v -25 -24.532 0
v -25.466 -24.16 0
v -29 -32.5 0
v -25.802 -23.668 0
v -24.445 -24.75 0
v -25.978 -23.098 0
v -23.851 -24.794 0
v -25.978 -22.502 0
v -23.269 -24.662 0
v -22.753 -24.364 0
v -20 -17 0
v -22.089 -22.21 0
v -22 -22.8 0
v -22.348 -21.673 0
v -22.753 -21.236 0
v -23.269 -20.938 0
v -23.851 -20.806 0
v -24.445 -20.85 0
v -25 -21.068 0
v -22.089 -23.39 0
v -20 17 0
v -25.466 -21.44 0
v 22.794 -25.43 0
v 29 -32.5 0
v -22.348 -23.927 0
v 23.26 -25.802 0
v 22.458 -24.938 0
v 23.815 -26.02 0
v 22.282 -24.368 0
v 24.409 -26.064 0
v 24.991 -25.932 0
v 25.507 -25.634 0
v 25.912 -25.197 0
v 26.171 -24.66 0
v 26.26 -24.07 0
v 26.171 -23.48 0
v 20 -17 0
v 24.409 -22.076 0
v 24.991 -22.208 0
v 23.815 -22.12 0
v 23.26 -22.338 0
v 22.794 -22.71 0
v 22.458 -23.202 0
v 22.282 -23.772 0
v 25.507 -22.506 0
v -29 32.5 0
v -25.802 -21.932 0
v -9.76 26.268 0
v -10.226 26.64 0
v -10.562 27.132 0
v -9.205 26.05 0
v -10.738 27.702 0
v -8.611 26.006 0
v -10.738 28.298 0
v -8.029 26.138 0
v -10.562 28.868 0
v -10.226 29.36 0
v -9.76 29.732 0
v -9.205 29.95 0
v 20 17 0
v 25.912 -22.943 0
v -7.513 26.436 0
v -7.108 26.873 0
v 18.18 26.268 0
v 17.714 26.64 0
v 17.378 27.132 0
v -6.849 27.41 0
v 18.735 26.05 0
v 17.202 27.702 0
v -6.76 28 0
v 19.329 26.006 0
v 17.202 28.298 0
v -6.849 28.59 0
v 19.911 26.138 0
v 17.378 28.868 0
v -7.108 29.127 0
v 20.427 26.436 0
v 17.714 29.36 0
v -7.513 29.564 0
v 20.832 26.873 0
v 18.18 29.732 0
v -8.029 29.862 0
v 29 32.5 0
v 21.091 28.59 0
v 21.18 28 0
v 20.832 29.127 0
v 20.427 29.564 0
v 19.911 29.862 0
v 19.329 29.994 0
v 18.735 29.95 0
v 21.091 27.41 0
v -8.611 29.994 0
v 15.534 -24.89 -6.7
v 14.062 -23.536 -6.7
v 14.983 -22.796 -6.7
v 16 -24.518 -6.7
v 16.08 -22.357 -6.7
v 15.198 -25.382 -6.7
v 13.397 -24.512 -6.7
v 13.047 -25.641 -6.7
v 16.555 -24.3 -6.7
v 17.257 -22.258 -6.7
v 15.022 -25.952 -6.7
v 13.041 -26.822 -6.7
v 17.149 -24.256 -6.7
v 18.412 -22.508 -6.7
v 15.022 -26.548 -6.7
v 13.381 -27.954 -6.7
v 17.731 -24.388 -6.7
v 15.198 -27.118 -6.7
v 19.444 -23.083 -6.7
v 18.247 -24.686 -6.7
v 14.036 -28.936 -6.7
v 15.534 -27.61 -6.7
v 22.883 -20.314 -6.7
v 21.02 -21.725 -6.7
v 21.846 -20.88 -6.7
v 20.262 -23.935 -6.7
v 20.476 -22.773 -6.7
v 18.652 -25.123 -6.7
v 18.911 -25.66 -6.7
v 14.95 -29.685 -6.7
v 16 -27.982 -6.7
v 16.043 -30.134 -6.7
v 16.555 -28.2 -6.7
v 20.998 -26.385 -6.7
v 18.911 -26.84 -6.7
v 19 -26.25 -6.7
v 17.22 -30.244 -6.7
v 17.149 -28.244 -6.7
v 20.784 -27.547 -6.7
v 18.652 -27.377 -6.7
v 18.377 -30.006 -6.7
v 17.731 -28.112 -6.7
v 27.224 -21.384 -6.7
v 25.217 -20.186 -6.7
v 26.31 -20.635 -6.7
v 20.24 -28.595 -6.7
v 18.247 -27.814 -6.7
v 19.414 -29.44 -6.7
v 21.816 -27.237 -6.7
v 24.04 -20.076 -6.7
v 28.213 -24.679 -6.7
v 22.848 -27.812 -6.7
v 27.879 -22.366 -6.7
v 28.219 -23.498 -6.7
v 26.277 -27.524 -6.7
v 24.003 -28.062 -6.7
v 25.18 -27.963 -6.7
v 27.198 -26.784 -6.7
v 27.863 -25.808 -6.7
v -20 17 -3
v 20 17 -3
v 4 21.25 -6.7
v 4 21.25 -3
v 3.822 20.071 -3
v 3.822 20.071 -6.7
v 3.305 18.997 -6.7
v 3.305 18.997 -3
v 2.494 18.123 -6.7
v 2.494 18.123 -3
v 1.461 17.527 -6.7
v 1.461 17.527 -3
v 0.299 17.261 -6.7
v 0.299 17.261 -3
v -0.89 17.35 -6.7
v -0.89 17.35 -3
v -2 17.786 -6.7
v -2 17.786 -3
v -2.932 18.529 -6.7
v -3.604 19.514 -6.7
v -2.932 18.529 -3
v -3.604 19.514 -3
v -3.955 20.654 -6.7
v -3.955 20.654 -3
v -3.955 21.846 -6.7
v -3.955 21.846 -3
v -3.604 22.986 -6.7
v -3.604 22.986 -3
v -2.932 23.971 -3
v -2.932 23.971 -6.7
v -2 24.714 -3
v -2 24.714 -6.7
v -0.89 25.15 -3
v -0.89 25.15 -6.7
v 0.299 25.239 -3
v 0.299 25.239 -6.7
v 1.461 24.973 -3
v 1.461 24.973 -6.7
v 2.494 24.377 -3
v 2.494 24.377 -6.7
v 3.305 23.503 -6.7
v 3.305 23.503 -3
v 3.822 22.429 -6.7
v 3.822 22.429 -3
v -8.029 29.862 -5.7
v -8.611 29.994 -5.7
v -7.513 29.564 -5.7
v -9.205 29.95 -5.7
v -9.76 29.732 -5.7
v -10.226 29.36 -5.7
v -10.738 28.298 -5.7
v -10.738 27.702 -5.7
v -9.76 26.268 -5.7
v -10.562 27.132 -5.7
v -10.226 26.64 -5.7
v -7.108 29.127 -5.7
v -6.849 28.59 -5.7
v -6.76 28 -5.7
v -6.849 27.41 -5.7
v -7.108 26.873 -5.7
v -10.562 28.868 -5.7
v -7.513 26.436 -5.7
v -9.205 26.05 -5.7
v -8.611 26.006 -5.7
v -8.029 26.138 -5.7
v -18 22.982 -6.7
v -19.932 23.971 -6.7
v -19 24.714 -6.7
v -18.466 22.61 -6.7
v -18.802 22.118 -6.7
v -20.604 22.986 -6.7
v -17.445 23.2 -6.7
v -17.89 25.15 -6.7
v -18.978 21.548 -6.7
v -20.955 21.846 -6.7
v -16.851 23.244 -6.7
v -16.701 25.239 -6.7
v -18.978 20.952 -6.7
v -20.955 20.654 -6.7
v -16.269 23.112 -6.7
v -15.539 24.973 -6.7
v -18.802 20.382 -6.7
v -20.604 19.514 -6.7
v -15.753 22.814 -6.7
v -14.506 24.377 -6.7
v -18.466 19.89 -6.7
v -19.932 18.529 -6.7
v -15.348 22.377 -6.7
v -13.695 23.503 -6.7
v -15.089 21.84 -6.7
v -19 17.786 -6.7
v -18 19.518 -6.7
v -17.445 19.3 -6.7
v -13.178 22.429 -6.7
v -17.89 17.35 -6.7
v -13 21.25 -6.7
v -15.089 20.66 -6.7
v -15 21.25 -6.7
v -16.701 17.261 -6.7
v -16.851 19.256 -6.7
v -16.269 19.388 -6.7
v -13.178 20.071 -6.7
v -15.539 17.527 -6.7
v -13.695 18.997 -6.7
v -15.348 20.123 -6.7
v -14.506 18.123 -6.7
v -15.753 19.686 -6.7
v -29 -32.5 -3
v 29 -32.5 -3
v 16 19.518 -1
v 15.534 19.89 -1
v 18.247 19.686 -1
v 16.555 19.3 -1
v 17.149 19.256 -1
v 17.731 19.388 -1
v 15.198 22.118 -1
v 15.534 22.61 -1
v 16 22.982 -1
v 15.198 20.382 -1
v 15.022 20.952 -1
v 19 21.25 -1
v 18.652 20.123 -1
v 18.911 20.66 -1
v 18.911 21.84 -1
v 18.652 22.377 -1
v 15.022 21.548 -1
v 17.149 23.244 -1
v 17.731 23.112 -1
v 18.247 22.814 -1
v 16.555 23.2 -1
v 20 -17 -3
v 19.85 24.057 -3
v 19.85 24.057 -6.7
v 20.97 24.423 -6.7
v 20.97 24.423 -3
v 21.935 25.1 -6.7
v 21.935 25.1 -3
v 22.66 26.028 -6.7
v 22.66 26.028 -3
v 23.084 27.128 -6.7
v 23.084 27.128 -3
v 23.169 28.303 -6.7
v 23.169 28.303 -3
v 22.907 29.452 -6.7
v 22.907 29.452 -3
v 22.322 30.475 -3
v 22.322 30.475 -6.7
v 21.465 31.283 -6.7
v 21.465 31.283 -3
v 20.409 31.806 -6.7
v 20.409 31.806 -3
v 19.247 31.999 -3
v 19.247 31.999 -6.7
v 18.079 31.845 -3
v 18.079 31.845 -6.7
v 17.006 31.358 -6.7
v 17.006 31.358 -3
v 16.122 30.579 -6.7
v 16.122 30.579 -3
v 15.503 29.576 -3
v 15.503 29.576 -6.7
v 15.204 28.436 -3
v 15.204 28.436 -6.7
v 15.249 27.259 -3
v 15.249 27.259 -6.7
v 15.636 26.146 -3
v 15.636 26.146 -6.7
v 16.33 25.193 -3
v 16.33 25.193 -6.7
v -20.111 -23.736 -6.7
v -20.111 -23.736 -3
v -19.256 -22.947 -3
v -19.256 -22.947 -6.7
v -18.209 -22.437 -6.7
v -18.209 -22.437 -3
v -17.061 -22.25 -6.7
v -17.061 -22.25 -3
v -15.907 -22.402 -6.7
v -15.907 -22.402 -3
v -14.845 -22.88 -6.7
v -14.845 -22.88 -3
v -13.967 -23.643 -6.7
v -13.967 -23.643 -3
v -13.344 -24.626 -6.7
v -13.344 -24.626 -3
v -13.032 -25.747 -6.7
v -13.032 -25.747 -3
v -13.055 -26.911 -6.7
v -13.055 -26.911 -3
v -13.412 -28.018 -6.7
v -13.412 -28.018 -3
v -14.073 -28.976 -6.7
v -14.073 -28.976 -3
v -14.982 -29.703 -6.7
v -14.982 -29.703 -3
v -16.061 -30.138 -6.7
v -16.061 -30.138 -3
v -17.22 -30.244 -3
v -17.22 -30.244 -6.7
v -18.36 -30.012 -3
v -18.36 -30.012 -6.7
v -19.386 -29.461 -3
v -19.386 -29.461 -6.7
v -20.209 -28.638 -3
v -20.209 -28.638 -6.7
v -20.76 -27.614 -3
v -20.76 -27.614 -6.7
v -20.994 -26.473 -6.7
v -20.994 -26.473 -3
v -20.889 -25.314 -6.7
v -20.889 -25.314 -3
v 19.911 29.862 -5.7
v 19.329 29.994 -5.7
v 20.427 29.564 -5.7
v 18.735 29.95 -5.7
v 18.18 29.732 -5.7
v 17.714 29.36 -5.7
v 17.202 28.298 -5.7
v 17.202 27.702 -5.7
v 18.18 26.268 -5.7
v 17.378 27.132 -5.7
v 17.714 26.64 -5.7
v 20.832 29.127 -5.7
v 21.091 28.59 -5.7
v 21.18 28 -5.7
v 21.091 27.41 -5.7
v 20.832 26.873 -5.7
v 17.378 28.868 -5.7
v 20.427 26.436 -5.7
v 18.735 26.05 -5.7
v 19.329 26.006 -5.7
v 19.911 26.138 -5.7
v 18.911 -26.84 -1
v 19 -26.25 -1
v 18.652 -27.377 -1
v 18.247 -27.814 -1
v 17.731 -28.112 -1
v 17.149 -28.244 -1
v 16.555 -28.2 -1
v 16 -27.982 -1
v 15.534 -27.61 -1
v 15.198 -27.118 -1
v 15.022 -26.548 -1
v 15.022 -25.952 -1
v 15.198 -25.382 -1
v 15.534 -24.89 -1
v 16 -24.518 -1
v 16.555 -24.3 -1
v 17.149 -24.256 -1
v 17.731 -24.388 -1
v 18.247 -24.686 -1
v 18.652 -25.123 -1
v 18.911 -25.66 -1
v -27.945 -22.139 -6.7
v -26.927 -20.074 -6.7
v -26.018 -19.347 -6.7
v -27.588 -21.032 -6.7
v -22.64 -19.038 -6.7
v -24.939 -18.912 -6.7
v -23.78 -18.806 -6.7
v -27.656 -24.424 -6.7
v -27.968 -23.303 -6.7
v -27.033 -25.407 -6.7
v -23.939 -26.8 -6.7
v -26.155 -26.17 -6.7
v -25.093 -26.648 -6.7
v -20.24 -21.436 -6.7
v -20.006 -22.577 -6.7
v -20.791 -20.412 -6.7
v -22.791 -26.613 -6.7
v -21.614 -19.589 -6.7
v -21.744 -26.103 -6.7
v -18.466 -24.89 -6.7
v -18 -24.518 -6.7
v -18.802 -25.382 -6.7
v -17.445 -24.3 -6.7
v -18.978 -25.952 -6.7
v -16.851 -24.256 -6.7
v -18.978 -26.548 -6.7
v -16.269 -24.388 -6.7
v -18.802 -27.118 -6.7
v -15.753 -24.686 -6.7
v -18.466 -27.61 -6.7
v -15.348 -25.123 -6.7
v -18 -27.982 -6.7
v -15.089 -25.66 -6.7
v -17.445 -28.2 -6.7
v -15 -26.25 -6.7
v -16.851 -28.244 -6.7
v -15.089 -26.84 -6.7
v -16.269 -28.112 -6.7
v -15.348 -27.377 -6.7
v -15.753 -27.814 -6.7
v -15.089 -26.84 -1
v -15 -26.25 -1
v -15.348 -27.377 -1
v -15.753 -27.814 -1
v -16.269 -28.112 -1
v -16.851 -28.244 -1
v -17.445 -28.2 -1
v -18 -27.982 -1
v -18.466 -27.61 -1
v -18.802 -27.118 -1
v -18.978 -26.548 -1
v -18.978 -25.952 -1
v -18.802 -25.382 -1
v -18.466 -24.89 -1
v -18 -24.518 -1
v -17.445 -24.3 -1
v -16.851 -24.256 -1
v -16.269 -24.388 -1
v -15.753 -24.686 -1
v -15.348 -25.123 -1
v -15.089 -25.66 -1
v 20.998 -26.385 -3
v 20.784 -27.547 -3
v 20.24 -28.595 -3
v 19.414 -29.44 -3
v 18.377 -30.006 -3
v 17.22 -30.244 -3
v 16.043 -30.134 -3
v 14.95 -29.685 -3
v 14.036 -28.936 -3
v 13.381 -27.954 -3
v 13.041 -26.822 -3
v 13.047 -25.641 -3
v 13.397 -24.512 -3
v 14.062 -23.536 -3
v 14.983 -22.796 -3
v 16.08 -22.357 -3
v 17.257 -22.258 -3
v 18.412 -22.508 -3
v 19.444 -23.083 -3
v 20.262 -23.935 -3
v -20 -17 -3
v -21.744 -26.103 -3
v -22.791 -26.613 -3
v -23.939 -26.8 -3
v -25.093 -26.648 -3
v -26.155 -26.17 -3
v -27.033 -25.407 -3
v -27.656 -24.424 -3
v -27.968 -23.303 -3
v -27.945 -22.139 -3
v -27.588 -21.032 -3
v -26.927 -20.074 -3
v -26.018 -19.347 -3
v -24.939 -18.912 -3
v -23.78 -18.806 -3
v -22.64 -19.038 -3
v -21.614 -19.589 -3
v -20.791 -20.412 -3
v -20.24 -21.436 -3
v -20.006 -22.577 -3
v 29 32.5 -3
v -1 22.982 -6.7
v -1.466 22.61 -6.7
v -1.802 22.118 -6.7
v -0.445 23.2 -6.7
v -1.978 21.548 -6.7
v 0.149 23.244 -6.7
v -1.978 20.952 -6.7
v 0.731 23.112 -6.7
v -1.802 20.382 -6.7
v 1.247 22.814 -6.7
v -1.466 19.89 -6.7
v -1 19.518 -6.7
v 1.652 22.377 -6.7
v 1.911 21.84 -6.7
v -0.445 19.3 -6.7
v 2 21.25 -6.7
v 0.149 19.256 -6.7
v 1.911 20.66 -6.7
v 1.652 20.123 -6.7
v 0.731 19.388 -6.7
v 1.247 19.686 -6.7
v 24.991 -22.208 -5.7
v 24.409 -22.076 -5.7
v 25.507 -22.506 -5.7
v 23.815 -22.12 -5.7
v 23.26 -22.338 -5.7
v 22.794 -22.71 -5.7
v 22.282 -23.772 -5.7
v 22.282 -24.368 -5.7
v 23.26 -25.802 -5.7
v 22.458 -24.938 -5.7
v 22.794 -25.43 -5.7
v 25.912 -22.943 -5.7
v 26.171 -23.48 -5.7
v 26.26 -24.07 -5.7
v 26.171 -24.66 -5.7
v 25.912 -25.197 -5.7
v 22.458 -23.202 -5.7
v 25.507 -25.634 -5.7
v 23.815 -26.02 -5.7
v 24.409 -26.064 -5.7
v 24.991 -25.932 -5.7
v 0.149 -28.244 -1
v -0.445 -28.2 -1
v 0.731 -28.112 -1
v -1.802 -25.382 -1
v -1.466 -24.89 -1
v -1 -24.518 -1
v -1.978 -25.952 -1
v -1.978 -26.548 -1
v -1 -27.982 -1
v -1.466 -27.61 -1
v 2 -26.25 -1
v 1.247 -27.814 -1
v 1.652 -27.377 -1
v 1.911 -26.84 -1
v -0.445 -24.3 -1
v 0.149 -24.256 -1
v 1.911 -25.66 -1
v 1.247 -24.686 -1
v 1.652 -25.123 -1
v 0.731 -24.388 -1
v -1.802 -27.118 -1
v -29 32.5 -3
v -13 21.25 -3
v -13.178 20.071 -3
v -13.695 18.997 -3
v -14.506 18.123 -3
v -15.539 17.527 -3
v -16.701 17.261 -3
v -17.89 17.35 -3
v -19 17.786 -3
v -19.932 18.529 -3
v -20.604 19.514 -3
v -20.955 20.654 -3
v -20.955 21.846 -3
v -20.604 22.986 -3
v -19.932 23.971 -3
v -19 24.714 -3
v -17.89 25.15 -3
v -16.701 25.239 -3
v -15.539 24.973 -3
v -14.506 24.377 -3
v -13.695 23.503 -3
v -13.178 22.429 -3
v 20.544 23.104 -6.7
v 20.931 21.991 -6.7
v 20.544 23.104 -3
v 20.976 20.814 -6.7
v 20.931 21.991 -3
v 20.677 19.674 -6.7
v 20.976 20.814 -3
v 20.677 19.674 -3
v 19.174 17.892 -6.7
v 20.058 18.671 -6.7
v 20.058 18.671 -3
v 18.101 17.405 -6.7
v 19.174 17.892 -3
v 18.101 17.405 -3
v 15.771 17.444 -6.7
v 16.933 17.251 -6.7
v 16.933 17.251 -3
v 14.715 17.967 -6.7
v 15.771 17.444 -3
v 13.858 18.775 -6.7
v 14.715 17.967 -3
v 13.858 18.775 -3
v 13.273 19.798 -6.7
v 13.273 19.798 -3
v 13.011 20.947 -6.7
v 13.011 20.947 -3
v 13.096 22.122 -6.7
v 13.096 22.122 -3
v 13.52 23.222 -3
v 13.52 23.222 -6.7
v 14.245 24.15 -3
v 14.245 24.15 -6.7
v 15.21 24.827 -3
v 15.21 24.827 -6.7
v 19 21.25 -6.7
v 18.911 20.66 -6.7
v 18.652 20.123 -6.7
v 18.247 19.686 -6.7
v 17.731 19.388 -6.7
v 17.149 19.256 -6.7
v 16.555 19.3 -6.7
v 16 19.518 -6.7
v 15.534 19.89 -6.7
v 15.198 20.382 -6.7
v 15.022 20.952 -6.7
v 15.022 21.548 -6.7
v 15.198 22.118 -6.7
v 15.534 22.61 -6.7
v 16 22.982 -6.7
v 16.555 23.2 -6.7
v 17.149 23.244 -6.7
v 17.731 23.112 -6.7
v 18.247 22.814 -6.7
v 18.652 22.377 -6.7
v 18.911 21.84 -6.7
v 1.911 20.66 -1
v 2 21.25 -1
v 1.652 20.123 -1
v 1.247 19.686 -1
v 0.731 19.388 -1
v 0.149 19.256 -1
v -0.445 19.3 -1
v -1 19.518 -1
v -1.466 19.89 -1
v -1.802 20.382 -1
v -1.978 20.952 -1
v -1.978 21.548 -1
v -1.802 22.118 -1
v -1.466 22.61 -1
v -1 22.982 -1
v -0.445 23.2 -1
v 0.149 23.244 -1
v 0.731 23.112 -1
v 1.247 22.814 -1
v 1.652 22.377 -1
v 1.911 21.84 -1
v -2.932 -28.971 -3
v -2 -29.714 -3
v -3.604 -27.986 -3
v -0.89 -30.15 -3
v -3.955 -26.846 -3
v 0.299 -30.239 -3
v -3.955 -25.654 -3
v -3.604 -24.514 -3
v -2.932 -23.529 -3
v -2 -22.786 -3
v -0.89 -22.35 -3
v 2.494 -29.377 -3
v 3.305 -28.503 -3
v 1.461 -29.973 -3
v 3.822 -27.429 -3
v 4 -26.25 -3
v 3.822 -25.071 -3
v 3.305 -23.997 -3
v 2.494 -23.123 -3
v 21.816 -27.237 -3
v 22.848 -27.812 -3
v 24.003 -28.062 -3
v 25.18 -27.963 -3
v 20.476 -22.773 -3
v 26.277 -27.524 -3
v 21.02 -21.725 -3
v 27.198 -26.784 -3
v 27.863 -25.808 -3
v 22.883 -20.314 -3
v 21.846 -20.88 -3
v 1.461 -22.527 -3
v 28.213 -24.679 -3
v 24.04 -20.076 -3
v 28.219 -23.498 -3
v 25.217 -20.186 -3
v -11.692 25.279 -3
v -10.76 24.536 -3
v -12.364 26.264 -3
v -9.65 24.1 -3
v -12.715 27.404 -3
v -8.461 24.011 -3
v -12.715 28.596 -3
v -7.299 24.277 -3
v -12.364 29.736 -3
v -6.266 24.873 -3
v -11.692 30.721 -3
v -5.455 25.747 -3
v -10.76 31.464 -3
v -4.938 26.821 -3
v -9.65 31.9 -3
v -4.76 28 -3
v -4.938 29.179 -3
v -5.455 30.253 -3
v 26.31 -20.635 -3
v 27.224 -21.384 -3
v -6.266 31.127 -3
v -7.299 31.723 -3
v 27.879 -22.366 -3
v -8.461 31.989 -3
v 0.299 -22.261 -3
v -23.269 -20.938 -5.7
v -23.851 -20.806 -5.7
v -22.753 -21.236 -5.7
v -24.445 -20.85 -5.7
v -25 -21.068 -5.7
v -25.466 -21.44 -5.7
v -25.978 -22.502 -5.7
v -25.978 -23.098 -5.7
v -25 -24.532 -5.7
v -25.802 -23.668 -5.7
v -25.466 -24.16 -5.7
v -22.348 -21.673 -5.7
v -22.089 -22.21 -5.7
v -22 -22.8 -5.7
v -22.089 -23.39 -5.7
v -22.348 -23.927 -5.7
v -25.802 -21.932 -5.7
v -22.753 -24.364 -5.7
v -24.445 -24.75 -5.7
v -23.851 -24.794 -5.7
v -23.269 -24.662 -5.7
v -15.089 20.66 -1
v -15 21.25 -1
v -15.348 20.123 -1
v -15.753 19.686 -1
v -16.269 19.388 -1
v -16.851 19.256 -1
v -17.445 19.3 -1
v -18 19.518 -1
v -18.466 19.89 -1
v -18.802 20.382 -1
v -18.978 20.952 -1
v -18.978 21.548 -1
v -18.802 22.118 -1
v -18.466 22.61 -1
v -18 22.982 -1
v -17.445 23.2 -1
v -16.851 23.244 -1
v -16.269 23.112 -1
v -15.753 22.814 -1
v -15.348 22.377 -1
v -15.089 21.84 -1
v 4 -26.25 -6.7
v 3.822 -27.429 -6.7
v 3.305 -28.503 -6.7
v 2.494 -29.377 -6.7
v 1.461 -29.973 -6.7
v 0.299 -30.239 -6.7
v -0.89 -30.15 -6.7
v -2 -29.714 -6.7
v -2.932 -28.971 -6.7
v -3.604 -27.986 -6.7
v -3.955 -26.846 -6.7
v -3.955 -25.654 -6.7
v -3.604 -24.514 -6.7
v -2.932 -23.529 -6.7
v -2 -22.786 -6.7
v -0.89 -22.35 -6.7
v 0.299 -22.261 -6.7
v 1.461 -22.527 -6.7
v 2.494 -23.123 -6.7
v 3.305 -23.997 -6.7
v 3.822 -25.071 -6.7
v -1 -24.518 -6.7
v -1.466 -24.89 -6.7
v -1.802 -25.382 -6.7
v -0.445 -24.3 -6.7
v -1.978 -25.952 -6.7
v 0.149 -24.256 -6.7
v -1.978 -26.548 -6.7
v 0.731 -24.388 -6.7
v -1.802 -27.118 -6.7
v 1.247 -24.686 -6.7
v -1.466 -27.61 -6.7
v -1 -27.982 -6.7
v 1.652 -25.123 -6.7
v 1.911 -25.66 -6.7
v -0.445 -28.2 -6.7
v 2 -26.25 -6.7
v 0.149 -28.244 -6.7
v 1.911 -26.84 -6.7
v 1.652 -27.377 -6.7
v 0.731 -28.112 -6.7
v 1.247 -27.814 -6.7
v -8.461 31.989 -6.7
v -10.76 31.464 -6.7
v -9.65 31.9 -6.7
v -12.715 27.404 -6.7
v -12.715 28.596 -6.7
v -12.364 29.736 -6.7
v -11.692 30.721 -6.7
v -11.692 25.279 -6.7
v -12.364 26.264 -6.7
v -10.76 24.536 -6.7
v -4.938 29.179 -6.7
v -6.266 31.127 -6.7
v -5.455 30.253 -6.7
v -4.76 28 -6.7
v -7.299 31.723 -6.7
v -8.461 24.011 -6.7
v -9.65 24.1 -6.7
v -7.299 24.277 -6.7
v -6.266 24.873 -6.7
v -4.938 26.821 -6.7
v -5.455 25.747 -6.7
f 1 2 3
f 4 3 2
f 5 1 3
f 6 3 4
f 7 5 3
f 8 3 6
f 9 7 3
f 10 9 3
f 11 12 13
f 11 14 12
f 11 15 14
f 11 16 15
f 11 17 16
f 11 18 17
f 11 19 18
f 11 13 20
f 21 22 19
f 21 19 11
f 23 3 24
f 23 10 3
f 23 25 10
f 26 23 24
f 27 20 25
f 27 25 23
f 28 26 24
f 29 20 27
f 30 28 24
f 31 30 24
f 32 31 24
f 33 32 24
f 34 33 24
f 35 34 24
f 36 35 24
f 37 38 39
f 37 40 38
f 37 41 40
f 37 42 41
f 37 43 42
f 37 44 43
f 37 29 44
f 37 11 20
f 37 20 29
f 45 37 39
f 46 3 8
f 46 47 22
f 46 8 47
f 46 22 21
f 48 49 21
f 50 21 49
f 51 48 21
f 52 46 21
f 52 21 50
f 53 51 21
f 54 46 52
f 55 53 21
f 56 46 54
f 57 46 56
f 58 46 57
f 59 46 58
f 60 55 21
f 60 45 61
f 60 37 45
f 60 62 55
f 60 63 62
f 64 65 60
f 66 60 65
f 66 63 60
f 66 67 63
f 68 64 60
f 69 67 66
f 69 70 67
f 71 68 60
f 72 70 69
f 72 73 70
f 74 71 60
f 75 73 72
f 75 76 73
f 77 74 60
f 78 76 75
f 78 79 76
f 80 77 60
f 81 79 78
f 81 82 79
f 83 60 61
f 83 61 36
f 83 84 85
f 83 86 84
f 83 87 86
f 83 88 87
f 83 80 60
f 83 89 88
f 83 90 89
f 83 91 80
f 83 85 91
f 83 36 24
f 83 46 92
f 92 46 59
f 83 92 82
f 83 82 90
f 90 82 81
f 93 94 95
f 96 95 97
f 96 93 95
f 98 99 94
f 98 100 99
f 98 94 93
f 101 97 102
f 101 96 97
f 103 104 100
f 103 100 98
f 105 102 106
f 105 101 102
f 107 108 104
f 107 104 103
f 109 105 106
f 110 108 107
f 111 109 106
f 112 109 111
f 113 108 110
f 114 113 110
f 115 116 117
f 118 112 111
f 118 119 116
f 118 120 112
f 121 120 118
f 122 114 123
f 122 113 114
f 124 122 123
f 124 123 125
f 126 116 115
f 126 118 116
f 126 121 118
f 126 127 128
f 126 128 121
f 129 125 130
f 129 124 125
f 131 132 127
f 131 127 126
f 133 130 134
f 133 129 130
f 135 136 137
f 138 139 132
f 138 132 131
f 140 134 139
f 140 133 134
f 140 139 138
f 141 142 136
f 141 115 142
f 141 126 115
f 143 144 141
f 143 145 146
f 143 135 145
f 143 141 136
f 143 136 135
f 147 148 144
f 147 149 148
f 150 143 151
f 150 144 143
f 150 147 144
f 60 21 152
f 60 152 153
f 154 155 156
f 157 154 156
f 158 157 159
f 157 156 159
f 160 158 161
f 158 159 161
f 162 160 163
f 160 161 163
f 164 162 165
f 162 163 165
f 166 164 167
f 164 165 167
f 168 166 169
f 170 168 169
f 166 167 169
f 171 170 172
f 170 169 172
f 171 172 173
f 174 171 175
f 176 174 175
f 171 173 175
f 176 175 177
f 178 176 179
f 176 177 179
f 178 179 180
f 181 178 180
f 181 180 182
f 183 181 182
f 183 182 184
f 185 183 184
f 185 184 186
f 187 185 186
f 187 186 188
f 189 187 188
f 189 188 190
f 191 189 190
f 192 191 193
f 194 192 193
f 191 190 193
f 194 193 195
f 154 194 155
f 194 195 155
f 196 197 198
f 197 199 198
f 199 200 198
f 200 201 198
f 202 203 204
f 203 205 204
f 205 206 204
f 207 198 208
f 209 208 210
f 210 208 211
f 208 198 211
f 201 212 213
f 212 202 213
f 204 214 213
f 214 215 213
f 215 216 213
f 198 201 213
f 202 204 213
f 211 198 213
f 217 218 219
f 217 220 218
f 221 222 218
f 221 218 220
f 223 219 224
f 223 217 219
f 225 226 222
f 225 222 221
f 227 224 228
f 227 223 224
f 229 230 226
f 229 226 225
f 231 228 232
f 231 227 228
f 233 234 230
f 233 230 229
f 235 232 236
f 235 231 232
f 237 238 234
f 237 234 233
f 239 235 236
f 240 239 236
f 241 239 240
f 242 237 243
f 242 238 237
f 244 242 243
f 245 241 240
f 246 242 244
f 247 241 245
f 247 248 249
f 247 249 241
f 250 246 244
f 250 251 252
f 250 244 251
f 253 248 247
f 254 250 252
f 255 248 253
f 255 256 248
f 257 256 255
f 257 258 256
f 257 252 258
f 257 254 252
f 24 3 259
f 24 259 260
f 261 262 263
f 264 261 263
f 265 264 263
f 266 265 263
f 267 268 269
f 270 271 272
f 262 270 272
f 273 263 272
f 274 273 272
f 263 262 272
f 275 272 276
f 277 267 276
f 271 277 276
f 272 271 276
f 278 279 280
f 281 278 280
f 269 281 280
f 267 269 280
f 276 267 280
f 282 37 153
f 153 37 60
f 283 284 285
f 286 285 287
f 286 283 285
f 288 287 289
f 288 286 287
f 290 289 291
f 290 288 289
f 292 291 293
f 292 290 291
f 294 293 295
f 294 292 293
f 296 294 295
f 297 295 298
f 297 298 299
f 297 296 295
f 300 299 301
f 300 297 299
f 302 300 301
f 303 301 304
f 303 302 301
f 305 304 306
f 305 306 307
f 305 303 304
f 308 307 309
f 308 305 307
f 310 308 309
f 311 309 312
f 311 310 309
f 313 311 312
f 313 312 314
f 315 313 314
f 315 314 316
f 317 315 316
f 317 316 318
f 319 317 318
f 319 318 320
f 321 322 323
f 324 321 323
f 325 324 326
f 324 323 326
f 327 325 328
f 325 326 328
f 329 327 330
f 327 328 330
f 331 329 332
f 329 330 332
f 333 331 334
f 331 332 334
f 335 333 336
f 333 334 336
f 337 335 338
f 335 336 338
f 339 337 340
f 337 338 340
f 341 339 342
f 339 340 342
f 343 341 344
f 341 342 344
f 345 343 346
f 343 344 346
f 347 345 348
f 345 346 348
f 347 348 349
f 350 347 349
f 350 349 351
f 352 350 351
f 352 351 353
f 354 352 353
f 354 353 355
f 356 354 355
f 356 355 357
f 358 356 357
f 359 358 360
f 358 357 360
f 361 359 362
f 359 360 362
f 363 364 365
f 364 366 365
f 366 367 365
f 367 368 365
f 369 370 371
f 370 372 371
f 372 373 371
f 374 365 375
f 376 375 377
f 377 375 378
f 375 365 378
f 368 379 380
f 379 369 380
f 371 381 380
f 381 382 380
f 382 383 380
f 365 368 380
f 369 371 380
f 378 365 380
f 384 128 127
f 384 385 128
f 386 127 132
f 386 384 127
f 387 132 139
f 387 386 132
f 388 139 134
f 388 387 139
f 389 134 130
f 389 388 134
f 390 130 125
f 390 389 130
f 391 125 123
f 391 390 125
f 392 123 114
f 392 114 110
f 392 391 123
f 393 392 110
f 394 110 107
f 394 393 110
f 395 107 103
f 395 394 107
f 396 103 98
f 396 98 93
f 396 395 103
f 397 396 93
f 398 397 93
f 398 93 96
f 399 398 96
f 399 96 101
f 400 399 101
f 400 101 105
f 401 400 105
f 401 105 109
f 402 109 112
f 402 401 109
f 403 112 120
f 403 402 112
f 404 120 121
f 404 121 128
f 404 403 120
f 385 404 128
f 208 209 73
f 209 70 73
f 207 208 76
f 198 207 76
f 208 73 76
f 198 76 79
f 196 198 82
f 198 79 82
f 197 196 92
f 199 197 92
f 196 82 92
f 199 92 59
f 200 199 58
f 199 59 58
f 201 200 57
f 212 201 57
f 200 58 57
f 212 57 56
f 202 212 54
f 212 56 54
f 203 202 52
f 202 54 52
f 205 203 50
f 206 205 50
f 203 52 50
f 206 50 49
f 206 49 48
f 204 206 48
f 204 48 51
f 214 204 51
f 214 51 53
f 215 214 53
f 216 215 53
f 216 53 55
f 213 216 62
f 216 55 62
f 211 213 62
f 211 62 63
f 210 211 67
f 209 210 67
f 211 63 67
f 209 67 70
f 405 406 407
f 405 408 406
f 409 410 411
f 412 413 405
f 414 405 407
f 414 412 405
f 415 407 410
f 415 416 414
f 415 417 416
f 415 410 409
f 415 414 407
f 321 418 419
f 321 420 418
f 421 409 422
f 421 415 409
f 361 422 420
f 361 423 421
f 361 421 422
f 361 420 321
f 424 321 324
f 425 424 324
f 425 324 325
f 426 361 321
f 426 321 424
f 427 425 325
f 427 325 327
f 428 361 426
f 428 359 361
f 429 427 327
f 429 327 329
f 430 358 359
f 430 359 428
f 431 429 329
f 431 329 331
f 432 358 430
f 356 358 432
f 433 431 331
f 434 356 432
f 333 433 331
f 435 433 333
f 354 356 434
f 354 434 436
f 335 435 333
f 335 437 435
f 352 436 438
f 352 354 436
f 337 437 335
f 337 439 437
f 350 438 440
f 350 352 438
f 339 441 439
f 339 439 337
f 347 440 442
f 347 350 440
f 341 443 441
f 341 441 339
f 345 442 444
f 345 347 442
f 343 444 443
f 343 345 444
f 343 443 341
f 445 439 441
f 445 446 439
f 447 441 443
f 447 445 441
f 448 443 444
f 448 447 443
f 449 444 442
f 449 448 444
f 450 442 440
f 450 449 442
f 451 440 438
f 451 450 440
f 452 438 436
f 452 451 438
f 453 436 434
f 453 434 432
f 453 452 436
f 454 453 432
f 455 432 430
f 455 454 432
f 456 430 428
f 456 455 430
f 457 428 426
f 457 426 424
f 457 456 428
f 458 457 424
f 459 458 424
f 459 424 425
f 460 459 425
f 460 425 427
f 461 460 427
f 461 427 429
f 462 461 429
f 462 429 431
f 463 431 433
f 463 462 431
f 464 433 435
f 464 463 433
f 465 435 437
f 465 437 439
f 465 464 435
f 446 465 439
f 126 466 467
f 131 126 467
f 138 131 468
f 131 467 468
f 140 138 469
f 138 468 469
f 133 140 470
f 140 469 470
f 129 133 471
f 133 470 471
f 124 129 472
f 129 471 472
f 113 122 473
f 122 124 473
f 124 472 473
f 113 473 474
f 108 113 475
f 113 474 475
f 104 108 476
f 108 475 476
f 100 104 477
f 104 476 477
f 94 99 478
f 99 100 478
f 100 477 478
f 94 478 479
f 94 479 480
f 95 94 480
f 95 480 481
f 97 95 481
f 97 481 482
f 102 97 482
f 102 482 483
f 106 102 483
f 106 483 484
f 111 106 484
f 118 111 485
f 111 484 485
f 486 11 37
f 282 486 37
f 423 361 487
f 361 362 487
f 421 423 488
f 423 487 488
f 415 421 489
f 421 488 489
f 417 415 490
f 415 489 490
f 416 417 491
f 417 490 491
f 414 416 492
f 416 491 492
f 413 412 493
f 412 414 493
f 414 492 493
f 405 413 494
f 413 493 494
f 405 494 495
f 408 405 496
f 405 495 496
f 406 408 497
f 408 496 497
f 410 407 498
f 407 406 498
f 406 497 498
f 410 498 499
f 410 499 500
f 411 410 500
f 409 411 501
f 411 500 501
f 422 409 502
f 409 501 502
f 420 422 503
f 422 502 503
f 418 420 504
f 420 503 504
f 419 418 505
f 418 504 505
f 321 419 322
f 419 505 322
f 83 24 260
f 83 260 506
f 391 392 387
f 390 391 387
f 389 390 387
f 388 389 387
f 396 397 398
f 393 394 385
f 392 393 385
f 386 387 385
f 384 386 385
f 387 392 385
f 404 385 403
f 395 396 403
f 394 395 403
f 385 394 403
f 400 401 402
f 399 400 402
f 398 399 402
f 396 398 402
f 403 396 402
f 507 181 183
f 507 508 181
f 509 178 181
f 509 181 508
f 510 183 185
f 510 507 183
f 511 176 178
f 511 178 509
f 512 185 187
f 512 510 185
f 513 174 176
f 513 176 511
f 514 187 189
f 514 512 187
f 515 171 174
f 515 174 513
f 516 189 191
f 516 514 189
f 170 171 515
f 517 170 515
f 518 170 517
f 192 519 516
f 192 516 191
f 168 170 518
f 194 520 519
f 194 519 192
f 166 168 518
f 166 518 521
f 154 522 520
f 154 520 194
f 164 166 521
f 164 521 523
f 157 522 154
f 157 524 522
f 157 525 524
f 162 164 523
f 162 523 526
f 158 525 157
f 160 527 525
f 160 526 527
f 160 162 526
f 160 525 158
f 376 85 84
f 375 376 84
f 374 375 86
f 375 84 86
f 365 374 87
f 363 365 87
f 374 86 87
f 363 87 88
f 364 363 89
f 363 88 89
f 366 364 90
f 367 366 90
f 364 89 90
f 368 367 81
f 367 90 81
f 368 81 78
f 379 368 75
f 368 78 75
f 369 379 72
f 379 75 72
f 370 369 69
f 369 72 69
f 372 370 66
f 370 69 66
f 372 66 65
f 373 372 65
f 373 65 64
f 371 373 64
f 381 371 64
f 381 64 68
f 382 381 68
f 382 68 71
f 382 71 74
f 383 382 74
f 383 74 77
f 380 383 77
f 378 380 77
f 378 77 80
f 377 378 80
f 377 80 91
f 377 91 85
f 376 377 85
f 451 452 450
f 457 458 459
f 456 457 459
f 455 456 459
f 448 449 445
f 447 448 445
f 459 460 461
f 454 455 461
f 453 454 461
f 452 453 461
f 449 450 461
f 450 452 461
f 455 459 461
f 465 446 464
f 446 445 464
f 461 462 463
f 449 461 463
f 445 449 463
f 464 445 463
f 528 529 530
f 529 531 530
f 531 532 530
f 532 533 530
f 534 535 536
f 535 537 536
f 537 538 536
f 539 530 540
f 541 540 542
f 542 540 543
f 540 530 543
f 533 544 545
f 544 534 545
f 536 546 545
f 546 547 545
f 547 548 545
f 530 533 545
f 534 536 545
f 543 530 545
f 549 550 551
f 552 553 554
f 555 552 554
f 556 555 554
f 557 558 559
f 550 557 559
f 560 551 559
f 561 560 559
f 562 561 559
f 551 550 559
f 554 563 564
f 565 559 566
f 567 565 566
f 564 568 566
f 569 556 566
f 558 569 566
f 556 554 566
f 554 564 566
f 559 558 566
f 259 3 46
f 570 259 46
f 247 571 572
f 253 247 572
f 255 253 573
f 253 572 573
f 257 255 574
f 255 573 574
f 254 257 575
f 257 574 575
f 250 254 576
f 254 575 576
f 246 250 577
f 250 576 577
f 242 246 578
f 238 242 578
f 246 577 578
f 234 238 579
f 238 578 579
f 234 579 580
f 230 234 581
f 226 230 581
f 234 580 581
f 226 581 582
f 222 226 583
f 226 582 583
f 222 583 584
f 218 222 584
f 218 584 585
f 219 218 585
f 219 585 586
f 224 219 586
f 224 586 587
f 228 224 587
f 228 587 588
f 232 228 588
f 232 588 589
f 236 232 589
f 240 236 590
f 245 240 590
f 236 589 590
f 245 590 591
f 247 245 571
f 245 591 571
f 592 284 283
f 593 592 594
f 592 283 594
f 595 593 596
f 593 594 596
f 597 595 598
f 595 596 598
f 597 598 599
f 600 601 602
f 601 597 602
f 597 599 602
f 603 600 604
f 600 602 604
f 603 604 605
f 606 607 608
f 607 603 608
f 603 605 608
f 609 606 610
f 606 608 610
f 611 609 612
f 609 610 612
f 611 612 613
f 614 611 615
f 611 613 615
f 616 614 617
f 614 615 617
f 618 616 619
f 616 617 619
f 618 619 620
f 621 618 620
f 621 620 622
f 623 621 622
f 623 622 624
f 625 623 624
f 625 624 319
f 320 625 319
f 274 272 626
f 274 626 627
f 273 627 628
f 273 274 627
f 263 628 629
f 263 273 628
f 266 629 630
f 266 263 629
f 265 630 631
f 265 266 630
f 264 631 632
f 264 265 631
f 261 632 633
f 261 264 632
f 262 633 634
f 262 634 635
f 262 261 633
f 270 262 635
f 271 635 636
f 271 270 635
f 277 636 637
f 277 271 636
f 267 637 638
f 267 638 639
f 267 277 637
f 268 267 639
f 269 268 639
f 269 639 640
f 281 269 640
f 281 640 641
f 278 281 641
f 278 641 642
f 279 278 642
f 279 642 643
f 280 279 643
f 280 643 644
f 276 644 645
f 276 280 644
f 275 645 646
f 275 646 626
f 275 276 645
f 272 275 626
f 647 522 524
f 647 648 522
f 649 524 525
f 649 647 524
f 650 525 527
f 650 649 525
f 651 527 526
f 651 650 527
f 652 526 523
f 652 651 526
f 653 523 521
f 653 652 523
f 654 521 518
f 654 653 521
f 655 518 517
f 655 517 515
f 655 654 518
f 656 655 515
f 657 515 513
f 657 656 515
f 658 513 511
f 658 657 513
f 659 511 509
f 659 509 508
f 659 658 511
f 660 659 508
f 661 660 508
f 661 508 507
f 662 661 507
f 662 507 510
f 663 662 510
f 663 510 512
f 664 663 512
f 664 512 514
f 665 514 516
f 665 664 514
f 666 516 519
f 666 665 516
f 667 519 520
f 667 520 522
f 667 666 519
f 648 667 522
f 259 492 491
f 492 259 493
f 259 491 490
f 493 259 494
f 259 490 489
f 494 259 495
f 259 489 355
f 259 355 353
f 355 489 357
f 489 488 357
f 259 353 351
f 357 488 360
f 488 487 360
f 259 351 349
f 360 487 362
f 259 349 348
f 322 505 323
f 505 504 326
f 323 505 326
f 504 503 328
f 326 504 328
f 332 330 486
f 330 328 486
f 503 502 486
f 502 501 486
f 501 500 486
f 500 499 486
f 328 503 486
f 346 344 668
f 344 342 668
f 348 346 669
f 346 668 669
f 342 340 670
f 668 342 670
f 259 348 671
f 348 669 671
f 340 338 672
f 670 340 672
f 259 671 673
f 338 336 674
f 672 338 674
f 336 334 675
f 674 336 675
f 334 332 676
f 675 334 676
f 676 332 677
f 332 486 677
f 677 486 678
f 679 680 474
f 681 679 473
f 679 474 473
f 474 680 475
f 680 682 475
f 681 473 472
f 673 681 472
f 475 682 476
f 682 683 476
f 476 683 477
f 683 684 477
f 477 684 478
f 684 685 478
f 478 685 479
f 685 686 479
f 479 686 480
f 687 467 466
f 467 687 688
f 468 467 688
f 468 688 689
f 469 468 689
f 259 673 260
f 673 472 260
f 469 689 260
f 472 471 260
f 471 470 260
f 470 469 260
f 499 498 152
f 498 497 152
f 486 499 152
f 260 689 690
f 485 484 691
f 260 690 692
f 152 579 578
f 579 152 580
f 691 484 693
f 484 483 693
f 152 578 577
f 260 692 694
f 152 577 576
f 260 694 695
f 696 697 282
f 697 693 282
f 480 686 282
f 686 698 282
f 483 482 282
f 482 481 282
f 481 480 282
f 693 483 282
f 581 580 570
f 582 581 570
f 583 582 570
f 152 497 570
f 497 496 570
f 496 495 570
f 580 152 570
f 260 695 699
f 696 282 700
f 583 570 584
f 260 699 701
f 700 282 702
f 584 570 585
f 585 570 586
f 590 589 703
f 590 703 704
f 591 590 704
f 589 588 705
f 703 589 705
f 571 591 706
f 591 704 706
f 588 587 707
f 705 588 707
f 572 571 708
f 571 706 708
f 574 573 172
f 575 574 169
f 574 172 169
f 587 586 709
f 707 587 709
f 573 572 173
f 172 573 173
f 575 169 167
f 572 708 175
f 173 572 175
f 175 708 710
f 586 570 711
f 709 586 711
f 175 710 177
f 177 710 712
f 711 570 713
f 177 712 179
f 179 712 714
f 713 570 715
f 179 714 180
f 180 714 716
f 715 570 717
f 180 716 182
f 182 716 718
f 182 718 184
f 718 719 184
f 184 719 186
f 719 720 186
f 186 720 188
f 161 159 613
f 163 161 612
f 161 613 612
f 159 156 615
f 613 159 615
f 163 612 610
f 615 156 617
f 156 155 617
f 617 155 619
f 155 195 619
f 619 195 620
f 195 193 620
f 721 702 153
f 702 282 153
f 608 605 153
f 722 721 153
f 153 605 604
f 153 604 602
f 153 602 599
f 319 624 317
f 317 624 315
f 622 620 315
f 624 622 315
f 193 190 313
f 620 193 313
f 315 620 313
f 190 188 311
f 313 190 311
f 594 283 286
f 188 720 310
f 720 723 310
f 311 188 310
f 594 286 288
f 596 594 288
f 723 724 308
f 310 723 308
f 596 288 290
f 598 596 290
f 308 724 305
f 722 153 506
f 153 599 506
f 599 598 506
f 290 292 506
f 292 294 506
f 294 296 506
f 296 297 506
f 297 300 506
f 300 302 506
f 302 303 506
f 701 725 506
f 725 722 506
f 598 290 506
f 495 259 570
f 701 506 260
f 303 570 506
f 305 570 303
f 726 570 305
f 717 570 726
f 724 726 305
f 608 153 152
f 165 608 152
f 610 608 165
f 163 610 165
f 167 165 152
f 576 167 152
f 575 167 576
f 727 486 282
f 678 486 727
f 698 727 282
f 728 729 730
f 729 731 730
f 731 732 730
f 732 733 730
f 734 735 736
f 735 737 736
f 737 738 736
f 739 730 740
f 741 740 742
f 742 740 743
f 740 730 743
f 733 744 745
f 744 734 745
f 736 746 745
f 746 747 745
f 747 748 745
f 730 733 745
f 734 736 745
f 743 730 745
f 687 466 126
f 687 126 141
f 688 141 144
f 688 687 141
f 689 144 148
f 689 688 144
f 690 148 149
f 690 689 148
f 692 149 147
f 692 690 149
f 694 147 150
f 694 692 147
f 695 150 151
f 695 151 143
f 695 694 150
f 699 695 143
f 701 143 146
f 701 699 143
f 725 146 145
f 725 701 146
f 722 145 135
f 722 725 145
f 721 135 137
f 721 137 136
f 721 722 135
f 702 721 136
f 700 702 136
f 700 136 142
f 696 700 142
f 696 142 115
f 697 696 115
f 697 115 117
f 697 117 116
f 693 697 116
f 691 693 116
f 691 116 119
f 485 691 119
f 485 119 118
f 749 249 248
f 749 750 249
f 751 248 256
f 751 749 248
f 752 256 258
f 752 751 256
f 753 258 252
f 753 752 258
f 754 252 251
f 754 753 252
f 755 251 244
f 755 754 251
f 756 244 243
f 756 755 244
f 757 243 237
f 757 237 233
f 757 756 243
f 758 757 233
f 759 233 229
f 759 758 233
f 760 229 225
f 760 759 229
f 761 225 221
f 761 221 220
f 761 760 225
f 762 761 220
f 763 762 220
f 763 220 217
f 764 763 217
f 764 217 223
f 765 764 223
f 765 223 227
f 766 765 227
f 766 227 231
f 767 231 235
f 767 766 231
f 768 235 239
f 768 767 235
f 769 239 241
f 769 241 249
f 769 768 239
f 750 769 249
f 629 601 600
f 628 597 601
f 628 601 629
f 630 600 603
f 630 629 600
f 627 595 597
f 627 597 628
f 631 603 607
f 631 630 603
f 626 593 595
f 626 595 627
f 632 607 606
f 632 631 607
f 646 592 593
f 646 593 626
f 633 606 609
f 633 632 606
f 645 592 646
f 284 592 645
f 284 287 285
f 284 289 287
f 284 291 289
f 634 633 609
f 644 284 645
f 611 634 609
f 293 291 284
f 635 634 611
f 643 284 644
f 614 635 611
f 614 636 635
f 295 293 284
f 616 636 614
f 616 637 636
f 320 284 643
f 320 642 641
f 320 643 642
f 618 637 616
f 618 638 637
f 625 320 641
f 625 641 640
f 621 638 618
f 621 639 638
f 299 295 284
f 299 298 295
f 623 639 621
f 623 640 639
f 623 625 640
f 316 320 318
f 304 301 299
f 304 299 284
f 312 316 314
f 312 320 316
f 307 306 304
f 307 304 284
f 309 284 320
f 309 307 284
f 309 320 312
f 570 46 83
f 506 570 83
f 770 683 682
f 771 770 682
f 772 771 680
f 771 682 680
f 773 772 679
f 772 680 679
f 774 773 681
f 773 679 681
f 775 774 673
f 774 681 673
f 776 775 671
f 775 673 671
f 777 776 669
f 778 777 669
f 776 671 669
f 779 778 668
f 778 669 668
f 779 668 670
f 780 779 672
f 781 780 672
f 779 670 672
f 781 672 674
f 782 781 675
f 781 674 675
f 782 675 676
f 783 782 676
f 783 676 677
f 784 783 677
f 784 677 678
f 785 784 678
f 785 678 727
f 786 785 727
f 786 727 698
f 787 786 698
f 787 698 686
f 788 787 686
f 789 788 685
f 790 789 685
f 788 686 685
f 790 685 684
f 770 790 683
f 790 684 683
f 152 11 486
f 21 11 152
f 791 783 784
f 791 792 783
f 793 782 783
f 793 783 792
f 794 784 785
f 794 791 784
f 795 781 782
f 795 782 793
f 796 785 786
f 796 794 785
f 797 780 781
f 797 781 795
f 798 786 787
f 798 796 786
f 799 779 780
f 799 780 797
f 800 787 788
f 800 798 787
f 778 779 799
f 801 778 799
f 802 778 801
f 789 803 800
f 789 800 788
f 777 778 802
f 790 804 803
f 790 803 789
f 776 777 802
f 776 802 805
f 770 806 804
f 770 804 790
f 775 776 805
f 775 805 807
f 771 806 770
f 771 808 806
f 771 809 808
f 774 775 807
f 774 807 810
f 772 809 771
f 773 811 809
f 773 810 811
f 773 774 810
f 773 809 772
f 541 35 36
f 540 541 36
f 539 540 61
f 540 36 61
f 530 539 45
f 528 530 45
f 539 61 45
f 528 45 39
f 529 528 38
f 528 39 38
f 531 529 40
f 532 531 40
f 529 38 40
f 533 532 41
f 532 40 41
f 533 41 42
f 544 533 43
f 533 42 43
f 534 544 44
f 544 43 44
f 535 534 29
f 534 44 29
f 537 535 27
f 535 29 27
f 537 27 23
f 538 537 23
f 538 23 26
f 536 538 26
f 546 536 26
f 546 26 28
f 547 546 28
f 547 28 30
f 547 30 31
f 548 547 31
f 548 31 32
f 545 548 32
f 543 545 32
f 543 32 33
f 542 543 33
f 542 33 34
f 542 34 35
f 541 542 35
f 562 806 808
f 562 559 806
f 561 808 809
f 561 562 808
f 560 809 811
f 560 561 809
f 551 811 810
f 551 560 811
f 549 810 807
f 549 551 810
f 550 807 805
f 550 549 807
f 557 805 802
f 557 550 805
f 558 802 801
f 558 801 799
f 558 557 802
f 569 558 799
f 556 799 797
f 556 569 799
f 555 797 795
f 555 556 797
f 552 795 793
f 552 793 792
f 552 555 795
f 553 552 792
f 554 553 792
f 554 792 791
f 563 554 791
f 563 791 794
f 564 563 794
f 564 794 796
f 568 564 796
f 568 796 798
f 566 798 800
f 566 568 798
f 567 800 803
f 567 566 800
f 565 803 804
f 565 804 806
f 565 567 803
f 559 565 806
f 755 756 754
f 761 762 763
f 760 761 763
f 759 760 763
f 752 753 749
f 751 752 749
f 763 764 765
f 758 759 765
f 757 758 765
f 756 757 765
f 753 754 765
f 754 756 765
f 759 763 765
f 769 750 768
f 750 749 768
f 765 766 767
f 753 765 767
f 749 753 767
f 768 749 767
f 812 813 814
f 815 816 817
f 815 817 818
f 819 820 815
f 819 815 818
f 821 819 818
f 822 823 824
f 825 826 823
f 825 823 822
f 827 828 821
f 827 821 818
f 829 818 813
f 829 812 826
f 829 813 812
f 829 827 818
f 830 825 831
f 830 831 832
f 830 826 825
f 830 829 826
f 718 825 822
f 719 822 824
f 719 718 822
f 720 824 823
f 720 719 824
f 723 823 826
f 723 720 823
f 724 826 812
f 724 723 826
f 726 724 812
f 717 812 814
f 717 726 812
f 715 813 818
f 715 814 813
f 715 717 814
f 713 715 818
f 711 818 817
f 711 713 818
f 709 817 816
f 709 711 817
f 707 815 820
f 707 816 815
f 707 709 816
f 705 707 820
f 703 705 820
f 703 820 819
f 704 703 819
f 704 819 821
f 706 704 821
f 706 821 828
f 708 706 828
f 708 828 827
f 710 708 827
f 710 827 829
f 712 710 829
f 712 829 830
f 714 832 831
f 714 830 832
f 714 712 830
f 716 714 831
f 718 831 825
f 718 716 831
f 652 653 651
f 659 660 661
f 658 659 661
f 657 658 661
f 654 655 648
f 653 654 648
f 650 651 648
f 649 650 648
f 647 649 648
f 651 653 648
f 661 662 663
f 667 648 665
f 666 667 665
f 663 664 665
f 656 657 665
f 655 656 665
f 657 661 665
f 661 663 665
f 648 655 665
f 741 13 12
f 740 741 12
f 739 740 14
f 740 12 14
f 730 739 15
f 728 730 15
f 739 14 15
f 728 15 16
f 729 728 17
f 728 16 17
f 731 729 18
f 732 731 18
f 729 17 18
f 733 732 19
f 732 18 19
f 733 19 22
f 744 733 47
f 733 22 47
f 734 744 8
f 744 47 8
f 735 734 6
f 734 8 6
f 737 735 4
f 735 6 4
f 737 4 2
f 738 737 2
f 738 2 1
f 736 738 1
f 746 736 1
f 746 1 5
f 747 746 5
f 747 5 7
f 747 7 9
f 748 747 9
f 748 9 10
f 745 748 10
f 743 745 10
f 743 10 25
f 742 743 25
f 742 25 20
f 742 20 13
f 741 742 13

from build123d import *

# Parameters (mm, degrees)
ESQUISSE1_W               = 58
ESQUISSE1_H               = 65
T_LE_DE_BASE_PLI_E1_DEPTH = 3
ENL_V_MAT_EXTRU_1_REACH   = 45.661
ESQUISSE6_R               = 2
ENL_V_MAT_EXTRU_2_REACH   = 45.661
ESQUISSE7_R               = 2
ESQUISSE8_R               = 4
ESQUISSE8_R_2             = 2
BOSS_EXTRU_1_DEPTH        = 2.7
ESQUISSE11_R              = 4
BOSS_EXTRU_3_DEPTH        = 1
ENL_V_MAT_EXTRU_3_REACH   = 46.07
ESQUISSE9_W               = 40
ESQUISSE9_H               = 34
ESQUISSE12_R              = 4
ESQUISSE12_R_2            = 2
BOSS_EXTRU_4_DEPTH        = 3.7
ESQUISSE13_R              = 2
BOSS_EXTRU_5_DEPTH        = 1


# Sheet-metal steps are written as plain solids
with BuildPart() as part:
    # Esquisse1 → Tôle de base pliée1 (new body)
    with BuildSketch(Plane.XY):
        Rectangle(ESQUISSE1_W, ESQUISSE1_H)
    extrude(amount=-T_LE_DE_BASE_PLI_E1_DEPTH)

    # Esquisse6 → Enlèv. mat.-Extru.1 (cut, up to next)
    with BuildSketch(Plane.XY, mode=Mode.PRIVATE) as enl_v_mat_extru_1_sk1:
        with Locations((-8.76, 28)):
            Circle(ESQUISSE6_R)
    enl_v_mat_extru_1_tool1 = extrude(enl_v_mat_extru_1_sk1.sketch, amount=-ENL_V_MAT_EXTRU_1_REACH, mode=Mode.PRIVATE) & part.part
    # Esquisse6 → Enlèv. mat.-Extru.1 (cut, up to next)
    with BuildSketch(Plane.XY, mode=Mode.PRIVATE) as enl_v_mat_extru_1_sk2:
        with Locations((19.18, 28)):
            Circle(ESQUISSE6_R)
    enl_v_mat_extru_1_tool2 = extrude(enl_v_mat_extru_1_sk2.sketch, amount=-ENL_V_MAT_EXTRU_1_REACH, mode=Mode.PRIVATE) & part.part
    # Esquisse6 → Enlèv. mat.-Extru.1 (cut, up to next)
    with BuildSketch(Plane.XY, mode=Mode.PRIVATE) as enl_v_mat_extru_1_sk3:
        with Locations((-24, -22.8)):
            Circle(ESQUISSE6_R)
    enl_v_mat_extru_1_tool3 = extrude(enl_v_mat_extru_1_sk3.sketch, amount=-ENL_V_MAT_EXTRU_1_REACH, mode=Mode.PRIVATE) & part.part
    # Esquisse6 → Enlèv. mat.-Extru.1 (cut, up to next)
    with BuildSketch(Plane.XY, mode=Mode.PRIVATE) as enl_v_mat_extru_1_sk4:
        with Locations((24.26, -24.07)):
            Circle(ESQUISSE6_R)
    enl_v_mat_extru_1_tool4 = extrude(enl_v_mat_extru_1_sk4.sketch, amount=-ENL_V_MAT_EXTRU_1_REACH, mode=Mode.PRIVATE) & part.part
    add(enl_v_mat_extru_1_tool1.solids().sort_by_distance((-8.76, 28, 0))[0], mode=Mode.SUBTRACT)
    add(enl_v_mat_extru_1_tool2.solids().sort_by_distance((19.18, 28, 0))[0], mode=Mode.SUBTRACT)
    add(enl_v_mat_extru_1_tool3.solids().sort_by_distance((-24, -22.8, 0))[0], mode=Mode.SUBTRACT)
    add(enl_v_mat_extru_1_tool4.solids().sort_by_distance((24.26, -24.07, 0))[0], mode=Mode.SUBTRACT)

    # Esquisse7 → Enlèv. mat.-Extru.2 (cut, up to next)
    with BuildSketch(Plane.XY, mode=Mode.PRIVATE) as enl_v_mat_extru_2_sk1:
        with Locations((-17, -26.25)):
            Circle(ESQUISSE7_R)
    enl_v_mat_extru_2_tool1 = extrude(enl_v_mat_extru_2_sk1.sketch, amount=-ENL_V_MAT_EXTRU_2_REACH, mode=Mode.PRIVATE) & part.part
    # Esquisse7 → Enlèv. mat.-Extru.2 (cut, up to next)
    with BuildSketch(Plane.XY, mode=Mode.PRIVATE) as enl_v_mat_extru_2_sk2:
        with Locations((0, -26.25)):
            Circle(ESQUISSE7_R)
    enl_v_mat_extru_2_tool2 = extrude(enl_v_mat_extru_2_sk2.sketch, amount=-ENL_V_MAT_EXTRU_2_REACH, mode=Mode.PRIVATE) & part.part
    # Esquisse7 → Enlèv. mat.-Extru.2 (cut, up to next)
    with BuildSketch(Plane.XY, mode=Mode.PRIVATE) as enl_v_mat_extru_2_sk3:
        with Locations((17, -26.25)):
            Circle(ESQUISSE7_R)
    enl_v_mat_extru_2_tool3 = extrude(enl_v_mat_extru_2_sk3.sketch, amount=-ENL_V_MAT_EXTRU_2_REACH, mode=Mode.PRIVATE) & part.part
    # Esquisse7 → Enlèv. mat.-Extru.2 (cut, up to next)
    with BuildSketch(Plane.XY, mode=Mode.PRIVATE) as enl_v_mat_extru_2_sk4:
        with Locations((0, 21.25)):
            Circle(ESQUISSE7_R)
    enl_v_mat_extru_2_tool4 = extrude(enl_v_mat_extru_2_sk4.sketch, amount=-ENL_V_MAT_EXTRU_2_REACH, mode=Mode.PRIVATE) & part.part
    # Esquisse7 → Enlèv. mat.-Extru.2 (cut, up to next)
    with BuildSketch(Plane.XY, mode=Mode.PRIVATE) as enl_v_mat_extru_2_sk5:
        with Locations((17, 21.25)):
            Circle(ESQUISSE7_R)
    enl_v_mat_extru_2_tool5 = extrude(enl_v_mat_extru_2_sk5.sketch, amount=-ENL_V_MAT_EXTRU_2_REACH, mode=Mode.PRIVATE) & part.part
    # Esquisse7 → Enlèv. mat.-Extru.2 (cut, up to next)
    with BuildSketch(Plane.XY, mode=Mode.PRIVATE) as enl_v_mat_extru_2_sk6:
        with Locations((-17, 21.25)):
            Circle(ESQUISSE7_R)
    enl_v_mat_extru_2_tool6 = extrude(enl_v_mat_extru_2_sk6.sketch, amount=-ENL_V_MAT_EXTRU_2_REACH, mode=Mode.PRIVATE) & part.part
    add(enl_v_mat_extru_2_tool1.solids().sort_by_distance((-17, -26.25, 0))[0], mode=Mode.SUBTRACT)
    add(enl_v_mat_extru_2_tool2.solids().sort_by_distance((0, -26.25, 0))[0], mode=Mode.SUBTRACT)
    add(enl_v_mat_extru_2_tool3.solids().sort_by_distance((17, -26.25, 0))[0], mode=Mode.SUBTRACT)
    add(enl_v_mat_extru_2_tool4.solids().sort_by_distance((0, 21.25, 0))[0], mode=Mode.SUBTRACT)
    add(enl_v_mat_extru_2_tool5.solids().sort_by_distance((17, 21.25, 0))[0], mode=Mode.SUBTRACT)
    add(enl_v_mat_extru_2_tool6.solids().sort_by_distance((-17, 21.25, 0))[0], mode=Mode.SUBTRACT)

    # Esquisse8 → Boss.-Extru.1 (add)
    # profile 1 of 4: a face of its own
    with BuildSketch(Plane.XY.offset(-3)):
        with Locations((-8.76, 28)):
            Circle(ESQUISSE8_R)
        with Locations((-8.76, 28)):
            Circle(ESQUISSE8_R_2, mode=Mode.SUBTRACT)
    # profile 2 of 4: a face of its own
    with BuildSketch(Plane.XY.offset(-3)):
        with Locations((19.18, 28)):
            Circle(ESQUISSE8_R)
        with Locations((19.18, 28)):
            Circle(ESQUISSE8_R_2, mode=Mode.SUBTRACT)
    # profile 3 of 4: a face of its own
    with BuildSketch(Plane.XY.offset(-3)):
        with Locations((24.26, -24.07)):
            Circle(ESQUISSE8_R)
        with Locations((24.26, -24.07)):
            Circle(ESQUISSE8_R_2, mode=Mode.SUBTRACT)
    # profile 4 of 4: a face of its own
    with BuildSketch(Plane.XY.offset(-3)):
        with Locations((-24, -22.8)):
            Circle(ESQUISSE8_R)
        with Locations((-24, -22.8)):
            Circle(ESQUISSE8_R_2, mode=Mode.SUBTRACT)
    extrude(amount=-BOSS_EXTRU_1_DEPTH)

    # Esquisse11 → Boss.-Extru.3 (add)
    with BuildSketch(Plane(origin=(0, 0, -5.7), x_dir=(-1, 0, 0), z_dir=(0, 0, -1))):
        with Locations(Location((24, -22.8, 0), (0, 0, 180))):
            Circle(ESQUISSE11_R)
        with Locations(Location((8.76, 28, 0), (0, 0, 180))):
            Circle(ESQUISSE11_R)
        with Locations(Location((-24.26, -24.07, 0), (0, 0, 180))):
            Circle(ESQUISSE11_R)
        with Locations(Location((-19.18, 28, 0), (0, 0, 180))):
            Circle(ESQUISSE11_R)
    extrude(amount=BOSS_EXTRU_3_DEPTH)

    # Esquisse9 → Enlèv. mat.-Extru.3 (cut, up to next)
    with BuildSketch(Plane.XY, mode=Mode.PRIVATE) as enl_v_mat_extru_3_sk1:
        Rectangle(ESQUISSE9_W, ESQUISSE9_H)
    enl_v_mat_extru_3_tool1 = extrude(enl_v_mat_extru_3_sk1.sketch, amount=-ENL_V_MAT_EXTRU_3_REACH, mode=Mode.PRIVATE) & part.part
    add(enl_v_mat_extru_3_tool1.solids().sort_by_distance((0, 0, 0))[0], mode=Mode.SUBTRACT)

    # Esquisse12 → Boss.-Extru.4 (add)
    # profile 1 of 6: a face of its own
    with BuildSketch(Plane(origin=(0, 0, -3), x_dir=(-1, 0, 0), z_dir=(0, 0, -1))):
        with Locations((-17, 21.25)):
            Circle(ESQUISSE12_R)
        with Locations(Location((-17, 21.25, 0), (0, 0, 180))):
            Circle(ESQUISSE12_R_2, mode=Mode.SUBTRACT)
    # profile 2 of 6: a face of its own
    with BuildSketch(Plane(origin=(0, 0, -3), x_dir=(-1, 0, 0), z_dir=(0, 0, -1))):
        with Locations(Location((0, 21.25, 0), (0, 0, 180))):
            Circle(ESQUISSE12_R)
        with Locations(Location((0, 21.25, 0), (0, 0, 180))):
            Circle(ESQUISSE12_R_2, mode=Mode.SUBTRACT)
    # profile 3 of 6: a face of its own
    with BuildSketch(Plane(origin=(0, 0, -3), x_dir=(-1, 0, 0), z_dir=(0, 0, -1))):
        with Locations(Location((17, 21.25, 0), (0, 0, 180))):
            Circle(ESQUISSE12_R)
        with Locations(Location((17, 21.25, 0), (0, 0, 180))):
            Circle(ESQUISSE12_R_2, mode=Mode.SUBTRACT)
    # profile 4 of 6: a face of its own
    with BuildSketch(Plane(origin=(0, 0, -3), x_dir=(-1, 0, 0), z_dir=(0, 0, -1))):
        with Locations((17, -26.25)):
            Circle(ESQUISSE12_R)
        with Locations(Location((17, -26.25, 0), (0, 0, 180))):
            Circle(ESQUISSE12_R_2, mode=Mode.SUBTRACT)
    # profile 5 of 6: a face of its own
    with BuildSketch(Plane(origin=(0, 0, -3), x_dir=(-1, 0, 0), z_dir=(0, 0, -1))):
        with Locations(Location((0, -26.25, 0), (0, 0, 180))):
            Circle(ESQUISSE12_R)
        with Locations(Location((0, -26.25, 0), (0, 0, 180))):
            Circle(ESQUISSE12_R_2, mode=Mode.SUBTRACT)
    # profile 6 of 6: a face of its own
    with BuildSketch(Plane(origin=(0, 0, -3), x_dir=(-1, 0, 0), z_dir=(0, 0, -1))):
        with Locations((-17, -26.25)):
            Circle(ESQUISSE12_R)
        with Locations(Location((-17, -26.25, 0), (0, 0, 180))):
            Circle(ESQUISSE12_R_2, mode=Mode.SUBTRACT)
    extrude(amount=BOSS_EXTRU_4_DEPTH)

    # Esquisse13 → Boss.-Extru.5 (add)
    with BuildSketch(Plane.XY):
        with Locations((-17, 21.25)):
            Circle(ESQUISSE13_R)
        with Locations((-17, -26.25)):
            Circle(ESQUISSE13_R)
        with Locations((0, 21.25)):
            Circle(ESQUISSE13_R)
        with Locations((0, -26.25)):
            Circle(ESQUISSE13_R)
        with Locations((17, -26.25)):
            Circle(ESQUISSE13_R)
        with Locations((17, 21.25)):
            Circle(ESQUISSE13_R)
    extrude(amount=-BOSS_EXTRU_5_DEPTH)


solid = part.part
